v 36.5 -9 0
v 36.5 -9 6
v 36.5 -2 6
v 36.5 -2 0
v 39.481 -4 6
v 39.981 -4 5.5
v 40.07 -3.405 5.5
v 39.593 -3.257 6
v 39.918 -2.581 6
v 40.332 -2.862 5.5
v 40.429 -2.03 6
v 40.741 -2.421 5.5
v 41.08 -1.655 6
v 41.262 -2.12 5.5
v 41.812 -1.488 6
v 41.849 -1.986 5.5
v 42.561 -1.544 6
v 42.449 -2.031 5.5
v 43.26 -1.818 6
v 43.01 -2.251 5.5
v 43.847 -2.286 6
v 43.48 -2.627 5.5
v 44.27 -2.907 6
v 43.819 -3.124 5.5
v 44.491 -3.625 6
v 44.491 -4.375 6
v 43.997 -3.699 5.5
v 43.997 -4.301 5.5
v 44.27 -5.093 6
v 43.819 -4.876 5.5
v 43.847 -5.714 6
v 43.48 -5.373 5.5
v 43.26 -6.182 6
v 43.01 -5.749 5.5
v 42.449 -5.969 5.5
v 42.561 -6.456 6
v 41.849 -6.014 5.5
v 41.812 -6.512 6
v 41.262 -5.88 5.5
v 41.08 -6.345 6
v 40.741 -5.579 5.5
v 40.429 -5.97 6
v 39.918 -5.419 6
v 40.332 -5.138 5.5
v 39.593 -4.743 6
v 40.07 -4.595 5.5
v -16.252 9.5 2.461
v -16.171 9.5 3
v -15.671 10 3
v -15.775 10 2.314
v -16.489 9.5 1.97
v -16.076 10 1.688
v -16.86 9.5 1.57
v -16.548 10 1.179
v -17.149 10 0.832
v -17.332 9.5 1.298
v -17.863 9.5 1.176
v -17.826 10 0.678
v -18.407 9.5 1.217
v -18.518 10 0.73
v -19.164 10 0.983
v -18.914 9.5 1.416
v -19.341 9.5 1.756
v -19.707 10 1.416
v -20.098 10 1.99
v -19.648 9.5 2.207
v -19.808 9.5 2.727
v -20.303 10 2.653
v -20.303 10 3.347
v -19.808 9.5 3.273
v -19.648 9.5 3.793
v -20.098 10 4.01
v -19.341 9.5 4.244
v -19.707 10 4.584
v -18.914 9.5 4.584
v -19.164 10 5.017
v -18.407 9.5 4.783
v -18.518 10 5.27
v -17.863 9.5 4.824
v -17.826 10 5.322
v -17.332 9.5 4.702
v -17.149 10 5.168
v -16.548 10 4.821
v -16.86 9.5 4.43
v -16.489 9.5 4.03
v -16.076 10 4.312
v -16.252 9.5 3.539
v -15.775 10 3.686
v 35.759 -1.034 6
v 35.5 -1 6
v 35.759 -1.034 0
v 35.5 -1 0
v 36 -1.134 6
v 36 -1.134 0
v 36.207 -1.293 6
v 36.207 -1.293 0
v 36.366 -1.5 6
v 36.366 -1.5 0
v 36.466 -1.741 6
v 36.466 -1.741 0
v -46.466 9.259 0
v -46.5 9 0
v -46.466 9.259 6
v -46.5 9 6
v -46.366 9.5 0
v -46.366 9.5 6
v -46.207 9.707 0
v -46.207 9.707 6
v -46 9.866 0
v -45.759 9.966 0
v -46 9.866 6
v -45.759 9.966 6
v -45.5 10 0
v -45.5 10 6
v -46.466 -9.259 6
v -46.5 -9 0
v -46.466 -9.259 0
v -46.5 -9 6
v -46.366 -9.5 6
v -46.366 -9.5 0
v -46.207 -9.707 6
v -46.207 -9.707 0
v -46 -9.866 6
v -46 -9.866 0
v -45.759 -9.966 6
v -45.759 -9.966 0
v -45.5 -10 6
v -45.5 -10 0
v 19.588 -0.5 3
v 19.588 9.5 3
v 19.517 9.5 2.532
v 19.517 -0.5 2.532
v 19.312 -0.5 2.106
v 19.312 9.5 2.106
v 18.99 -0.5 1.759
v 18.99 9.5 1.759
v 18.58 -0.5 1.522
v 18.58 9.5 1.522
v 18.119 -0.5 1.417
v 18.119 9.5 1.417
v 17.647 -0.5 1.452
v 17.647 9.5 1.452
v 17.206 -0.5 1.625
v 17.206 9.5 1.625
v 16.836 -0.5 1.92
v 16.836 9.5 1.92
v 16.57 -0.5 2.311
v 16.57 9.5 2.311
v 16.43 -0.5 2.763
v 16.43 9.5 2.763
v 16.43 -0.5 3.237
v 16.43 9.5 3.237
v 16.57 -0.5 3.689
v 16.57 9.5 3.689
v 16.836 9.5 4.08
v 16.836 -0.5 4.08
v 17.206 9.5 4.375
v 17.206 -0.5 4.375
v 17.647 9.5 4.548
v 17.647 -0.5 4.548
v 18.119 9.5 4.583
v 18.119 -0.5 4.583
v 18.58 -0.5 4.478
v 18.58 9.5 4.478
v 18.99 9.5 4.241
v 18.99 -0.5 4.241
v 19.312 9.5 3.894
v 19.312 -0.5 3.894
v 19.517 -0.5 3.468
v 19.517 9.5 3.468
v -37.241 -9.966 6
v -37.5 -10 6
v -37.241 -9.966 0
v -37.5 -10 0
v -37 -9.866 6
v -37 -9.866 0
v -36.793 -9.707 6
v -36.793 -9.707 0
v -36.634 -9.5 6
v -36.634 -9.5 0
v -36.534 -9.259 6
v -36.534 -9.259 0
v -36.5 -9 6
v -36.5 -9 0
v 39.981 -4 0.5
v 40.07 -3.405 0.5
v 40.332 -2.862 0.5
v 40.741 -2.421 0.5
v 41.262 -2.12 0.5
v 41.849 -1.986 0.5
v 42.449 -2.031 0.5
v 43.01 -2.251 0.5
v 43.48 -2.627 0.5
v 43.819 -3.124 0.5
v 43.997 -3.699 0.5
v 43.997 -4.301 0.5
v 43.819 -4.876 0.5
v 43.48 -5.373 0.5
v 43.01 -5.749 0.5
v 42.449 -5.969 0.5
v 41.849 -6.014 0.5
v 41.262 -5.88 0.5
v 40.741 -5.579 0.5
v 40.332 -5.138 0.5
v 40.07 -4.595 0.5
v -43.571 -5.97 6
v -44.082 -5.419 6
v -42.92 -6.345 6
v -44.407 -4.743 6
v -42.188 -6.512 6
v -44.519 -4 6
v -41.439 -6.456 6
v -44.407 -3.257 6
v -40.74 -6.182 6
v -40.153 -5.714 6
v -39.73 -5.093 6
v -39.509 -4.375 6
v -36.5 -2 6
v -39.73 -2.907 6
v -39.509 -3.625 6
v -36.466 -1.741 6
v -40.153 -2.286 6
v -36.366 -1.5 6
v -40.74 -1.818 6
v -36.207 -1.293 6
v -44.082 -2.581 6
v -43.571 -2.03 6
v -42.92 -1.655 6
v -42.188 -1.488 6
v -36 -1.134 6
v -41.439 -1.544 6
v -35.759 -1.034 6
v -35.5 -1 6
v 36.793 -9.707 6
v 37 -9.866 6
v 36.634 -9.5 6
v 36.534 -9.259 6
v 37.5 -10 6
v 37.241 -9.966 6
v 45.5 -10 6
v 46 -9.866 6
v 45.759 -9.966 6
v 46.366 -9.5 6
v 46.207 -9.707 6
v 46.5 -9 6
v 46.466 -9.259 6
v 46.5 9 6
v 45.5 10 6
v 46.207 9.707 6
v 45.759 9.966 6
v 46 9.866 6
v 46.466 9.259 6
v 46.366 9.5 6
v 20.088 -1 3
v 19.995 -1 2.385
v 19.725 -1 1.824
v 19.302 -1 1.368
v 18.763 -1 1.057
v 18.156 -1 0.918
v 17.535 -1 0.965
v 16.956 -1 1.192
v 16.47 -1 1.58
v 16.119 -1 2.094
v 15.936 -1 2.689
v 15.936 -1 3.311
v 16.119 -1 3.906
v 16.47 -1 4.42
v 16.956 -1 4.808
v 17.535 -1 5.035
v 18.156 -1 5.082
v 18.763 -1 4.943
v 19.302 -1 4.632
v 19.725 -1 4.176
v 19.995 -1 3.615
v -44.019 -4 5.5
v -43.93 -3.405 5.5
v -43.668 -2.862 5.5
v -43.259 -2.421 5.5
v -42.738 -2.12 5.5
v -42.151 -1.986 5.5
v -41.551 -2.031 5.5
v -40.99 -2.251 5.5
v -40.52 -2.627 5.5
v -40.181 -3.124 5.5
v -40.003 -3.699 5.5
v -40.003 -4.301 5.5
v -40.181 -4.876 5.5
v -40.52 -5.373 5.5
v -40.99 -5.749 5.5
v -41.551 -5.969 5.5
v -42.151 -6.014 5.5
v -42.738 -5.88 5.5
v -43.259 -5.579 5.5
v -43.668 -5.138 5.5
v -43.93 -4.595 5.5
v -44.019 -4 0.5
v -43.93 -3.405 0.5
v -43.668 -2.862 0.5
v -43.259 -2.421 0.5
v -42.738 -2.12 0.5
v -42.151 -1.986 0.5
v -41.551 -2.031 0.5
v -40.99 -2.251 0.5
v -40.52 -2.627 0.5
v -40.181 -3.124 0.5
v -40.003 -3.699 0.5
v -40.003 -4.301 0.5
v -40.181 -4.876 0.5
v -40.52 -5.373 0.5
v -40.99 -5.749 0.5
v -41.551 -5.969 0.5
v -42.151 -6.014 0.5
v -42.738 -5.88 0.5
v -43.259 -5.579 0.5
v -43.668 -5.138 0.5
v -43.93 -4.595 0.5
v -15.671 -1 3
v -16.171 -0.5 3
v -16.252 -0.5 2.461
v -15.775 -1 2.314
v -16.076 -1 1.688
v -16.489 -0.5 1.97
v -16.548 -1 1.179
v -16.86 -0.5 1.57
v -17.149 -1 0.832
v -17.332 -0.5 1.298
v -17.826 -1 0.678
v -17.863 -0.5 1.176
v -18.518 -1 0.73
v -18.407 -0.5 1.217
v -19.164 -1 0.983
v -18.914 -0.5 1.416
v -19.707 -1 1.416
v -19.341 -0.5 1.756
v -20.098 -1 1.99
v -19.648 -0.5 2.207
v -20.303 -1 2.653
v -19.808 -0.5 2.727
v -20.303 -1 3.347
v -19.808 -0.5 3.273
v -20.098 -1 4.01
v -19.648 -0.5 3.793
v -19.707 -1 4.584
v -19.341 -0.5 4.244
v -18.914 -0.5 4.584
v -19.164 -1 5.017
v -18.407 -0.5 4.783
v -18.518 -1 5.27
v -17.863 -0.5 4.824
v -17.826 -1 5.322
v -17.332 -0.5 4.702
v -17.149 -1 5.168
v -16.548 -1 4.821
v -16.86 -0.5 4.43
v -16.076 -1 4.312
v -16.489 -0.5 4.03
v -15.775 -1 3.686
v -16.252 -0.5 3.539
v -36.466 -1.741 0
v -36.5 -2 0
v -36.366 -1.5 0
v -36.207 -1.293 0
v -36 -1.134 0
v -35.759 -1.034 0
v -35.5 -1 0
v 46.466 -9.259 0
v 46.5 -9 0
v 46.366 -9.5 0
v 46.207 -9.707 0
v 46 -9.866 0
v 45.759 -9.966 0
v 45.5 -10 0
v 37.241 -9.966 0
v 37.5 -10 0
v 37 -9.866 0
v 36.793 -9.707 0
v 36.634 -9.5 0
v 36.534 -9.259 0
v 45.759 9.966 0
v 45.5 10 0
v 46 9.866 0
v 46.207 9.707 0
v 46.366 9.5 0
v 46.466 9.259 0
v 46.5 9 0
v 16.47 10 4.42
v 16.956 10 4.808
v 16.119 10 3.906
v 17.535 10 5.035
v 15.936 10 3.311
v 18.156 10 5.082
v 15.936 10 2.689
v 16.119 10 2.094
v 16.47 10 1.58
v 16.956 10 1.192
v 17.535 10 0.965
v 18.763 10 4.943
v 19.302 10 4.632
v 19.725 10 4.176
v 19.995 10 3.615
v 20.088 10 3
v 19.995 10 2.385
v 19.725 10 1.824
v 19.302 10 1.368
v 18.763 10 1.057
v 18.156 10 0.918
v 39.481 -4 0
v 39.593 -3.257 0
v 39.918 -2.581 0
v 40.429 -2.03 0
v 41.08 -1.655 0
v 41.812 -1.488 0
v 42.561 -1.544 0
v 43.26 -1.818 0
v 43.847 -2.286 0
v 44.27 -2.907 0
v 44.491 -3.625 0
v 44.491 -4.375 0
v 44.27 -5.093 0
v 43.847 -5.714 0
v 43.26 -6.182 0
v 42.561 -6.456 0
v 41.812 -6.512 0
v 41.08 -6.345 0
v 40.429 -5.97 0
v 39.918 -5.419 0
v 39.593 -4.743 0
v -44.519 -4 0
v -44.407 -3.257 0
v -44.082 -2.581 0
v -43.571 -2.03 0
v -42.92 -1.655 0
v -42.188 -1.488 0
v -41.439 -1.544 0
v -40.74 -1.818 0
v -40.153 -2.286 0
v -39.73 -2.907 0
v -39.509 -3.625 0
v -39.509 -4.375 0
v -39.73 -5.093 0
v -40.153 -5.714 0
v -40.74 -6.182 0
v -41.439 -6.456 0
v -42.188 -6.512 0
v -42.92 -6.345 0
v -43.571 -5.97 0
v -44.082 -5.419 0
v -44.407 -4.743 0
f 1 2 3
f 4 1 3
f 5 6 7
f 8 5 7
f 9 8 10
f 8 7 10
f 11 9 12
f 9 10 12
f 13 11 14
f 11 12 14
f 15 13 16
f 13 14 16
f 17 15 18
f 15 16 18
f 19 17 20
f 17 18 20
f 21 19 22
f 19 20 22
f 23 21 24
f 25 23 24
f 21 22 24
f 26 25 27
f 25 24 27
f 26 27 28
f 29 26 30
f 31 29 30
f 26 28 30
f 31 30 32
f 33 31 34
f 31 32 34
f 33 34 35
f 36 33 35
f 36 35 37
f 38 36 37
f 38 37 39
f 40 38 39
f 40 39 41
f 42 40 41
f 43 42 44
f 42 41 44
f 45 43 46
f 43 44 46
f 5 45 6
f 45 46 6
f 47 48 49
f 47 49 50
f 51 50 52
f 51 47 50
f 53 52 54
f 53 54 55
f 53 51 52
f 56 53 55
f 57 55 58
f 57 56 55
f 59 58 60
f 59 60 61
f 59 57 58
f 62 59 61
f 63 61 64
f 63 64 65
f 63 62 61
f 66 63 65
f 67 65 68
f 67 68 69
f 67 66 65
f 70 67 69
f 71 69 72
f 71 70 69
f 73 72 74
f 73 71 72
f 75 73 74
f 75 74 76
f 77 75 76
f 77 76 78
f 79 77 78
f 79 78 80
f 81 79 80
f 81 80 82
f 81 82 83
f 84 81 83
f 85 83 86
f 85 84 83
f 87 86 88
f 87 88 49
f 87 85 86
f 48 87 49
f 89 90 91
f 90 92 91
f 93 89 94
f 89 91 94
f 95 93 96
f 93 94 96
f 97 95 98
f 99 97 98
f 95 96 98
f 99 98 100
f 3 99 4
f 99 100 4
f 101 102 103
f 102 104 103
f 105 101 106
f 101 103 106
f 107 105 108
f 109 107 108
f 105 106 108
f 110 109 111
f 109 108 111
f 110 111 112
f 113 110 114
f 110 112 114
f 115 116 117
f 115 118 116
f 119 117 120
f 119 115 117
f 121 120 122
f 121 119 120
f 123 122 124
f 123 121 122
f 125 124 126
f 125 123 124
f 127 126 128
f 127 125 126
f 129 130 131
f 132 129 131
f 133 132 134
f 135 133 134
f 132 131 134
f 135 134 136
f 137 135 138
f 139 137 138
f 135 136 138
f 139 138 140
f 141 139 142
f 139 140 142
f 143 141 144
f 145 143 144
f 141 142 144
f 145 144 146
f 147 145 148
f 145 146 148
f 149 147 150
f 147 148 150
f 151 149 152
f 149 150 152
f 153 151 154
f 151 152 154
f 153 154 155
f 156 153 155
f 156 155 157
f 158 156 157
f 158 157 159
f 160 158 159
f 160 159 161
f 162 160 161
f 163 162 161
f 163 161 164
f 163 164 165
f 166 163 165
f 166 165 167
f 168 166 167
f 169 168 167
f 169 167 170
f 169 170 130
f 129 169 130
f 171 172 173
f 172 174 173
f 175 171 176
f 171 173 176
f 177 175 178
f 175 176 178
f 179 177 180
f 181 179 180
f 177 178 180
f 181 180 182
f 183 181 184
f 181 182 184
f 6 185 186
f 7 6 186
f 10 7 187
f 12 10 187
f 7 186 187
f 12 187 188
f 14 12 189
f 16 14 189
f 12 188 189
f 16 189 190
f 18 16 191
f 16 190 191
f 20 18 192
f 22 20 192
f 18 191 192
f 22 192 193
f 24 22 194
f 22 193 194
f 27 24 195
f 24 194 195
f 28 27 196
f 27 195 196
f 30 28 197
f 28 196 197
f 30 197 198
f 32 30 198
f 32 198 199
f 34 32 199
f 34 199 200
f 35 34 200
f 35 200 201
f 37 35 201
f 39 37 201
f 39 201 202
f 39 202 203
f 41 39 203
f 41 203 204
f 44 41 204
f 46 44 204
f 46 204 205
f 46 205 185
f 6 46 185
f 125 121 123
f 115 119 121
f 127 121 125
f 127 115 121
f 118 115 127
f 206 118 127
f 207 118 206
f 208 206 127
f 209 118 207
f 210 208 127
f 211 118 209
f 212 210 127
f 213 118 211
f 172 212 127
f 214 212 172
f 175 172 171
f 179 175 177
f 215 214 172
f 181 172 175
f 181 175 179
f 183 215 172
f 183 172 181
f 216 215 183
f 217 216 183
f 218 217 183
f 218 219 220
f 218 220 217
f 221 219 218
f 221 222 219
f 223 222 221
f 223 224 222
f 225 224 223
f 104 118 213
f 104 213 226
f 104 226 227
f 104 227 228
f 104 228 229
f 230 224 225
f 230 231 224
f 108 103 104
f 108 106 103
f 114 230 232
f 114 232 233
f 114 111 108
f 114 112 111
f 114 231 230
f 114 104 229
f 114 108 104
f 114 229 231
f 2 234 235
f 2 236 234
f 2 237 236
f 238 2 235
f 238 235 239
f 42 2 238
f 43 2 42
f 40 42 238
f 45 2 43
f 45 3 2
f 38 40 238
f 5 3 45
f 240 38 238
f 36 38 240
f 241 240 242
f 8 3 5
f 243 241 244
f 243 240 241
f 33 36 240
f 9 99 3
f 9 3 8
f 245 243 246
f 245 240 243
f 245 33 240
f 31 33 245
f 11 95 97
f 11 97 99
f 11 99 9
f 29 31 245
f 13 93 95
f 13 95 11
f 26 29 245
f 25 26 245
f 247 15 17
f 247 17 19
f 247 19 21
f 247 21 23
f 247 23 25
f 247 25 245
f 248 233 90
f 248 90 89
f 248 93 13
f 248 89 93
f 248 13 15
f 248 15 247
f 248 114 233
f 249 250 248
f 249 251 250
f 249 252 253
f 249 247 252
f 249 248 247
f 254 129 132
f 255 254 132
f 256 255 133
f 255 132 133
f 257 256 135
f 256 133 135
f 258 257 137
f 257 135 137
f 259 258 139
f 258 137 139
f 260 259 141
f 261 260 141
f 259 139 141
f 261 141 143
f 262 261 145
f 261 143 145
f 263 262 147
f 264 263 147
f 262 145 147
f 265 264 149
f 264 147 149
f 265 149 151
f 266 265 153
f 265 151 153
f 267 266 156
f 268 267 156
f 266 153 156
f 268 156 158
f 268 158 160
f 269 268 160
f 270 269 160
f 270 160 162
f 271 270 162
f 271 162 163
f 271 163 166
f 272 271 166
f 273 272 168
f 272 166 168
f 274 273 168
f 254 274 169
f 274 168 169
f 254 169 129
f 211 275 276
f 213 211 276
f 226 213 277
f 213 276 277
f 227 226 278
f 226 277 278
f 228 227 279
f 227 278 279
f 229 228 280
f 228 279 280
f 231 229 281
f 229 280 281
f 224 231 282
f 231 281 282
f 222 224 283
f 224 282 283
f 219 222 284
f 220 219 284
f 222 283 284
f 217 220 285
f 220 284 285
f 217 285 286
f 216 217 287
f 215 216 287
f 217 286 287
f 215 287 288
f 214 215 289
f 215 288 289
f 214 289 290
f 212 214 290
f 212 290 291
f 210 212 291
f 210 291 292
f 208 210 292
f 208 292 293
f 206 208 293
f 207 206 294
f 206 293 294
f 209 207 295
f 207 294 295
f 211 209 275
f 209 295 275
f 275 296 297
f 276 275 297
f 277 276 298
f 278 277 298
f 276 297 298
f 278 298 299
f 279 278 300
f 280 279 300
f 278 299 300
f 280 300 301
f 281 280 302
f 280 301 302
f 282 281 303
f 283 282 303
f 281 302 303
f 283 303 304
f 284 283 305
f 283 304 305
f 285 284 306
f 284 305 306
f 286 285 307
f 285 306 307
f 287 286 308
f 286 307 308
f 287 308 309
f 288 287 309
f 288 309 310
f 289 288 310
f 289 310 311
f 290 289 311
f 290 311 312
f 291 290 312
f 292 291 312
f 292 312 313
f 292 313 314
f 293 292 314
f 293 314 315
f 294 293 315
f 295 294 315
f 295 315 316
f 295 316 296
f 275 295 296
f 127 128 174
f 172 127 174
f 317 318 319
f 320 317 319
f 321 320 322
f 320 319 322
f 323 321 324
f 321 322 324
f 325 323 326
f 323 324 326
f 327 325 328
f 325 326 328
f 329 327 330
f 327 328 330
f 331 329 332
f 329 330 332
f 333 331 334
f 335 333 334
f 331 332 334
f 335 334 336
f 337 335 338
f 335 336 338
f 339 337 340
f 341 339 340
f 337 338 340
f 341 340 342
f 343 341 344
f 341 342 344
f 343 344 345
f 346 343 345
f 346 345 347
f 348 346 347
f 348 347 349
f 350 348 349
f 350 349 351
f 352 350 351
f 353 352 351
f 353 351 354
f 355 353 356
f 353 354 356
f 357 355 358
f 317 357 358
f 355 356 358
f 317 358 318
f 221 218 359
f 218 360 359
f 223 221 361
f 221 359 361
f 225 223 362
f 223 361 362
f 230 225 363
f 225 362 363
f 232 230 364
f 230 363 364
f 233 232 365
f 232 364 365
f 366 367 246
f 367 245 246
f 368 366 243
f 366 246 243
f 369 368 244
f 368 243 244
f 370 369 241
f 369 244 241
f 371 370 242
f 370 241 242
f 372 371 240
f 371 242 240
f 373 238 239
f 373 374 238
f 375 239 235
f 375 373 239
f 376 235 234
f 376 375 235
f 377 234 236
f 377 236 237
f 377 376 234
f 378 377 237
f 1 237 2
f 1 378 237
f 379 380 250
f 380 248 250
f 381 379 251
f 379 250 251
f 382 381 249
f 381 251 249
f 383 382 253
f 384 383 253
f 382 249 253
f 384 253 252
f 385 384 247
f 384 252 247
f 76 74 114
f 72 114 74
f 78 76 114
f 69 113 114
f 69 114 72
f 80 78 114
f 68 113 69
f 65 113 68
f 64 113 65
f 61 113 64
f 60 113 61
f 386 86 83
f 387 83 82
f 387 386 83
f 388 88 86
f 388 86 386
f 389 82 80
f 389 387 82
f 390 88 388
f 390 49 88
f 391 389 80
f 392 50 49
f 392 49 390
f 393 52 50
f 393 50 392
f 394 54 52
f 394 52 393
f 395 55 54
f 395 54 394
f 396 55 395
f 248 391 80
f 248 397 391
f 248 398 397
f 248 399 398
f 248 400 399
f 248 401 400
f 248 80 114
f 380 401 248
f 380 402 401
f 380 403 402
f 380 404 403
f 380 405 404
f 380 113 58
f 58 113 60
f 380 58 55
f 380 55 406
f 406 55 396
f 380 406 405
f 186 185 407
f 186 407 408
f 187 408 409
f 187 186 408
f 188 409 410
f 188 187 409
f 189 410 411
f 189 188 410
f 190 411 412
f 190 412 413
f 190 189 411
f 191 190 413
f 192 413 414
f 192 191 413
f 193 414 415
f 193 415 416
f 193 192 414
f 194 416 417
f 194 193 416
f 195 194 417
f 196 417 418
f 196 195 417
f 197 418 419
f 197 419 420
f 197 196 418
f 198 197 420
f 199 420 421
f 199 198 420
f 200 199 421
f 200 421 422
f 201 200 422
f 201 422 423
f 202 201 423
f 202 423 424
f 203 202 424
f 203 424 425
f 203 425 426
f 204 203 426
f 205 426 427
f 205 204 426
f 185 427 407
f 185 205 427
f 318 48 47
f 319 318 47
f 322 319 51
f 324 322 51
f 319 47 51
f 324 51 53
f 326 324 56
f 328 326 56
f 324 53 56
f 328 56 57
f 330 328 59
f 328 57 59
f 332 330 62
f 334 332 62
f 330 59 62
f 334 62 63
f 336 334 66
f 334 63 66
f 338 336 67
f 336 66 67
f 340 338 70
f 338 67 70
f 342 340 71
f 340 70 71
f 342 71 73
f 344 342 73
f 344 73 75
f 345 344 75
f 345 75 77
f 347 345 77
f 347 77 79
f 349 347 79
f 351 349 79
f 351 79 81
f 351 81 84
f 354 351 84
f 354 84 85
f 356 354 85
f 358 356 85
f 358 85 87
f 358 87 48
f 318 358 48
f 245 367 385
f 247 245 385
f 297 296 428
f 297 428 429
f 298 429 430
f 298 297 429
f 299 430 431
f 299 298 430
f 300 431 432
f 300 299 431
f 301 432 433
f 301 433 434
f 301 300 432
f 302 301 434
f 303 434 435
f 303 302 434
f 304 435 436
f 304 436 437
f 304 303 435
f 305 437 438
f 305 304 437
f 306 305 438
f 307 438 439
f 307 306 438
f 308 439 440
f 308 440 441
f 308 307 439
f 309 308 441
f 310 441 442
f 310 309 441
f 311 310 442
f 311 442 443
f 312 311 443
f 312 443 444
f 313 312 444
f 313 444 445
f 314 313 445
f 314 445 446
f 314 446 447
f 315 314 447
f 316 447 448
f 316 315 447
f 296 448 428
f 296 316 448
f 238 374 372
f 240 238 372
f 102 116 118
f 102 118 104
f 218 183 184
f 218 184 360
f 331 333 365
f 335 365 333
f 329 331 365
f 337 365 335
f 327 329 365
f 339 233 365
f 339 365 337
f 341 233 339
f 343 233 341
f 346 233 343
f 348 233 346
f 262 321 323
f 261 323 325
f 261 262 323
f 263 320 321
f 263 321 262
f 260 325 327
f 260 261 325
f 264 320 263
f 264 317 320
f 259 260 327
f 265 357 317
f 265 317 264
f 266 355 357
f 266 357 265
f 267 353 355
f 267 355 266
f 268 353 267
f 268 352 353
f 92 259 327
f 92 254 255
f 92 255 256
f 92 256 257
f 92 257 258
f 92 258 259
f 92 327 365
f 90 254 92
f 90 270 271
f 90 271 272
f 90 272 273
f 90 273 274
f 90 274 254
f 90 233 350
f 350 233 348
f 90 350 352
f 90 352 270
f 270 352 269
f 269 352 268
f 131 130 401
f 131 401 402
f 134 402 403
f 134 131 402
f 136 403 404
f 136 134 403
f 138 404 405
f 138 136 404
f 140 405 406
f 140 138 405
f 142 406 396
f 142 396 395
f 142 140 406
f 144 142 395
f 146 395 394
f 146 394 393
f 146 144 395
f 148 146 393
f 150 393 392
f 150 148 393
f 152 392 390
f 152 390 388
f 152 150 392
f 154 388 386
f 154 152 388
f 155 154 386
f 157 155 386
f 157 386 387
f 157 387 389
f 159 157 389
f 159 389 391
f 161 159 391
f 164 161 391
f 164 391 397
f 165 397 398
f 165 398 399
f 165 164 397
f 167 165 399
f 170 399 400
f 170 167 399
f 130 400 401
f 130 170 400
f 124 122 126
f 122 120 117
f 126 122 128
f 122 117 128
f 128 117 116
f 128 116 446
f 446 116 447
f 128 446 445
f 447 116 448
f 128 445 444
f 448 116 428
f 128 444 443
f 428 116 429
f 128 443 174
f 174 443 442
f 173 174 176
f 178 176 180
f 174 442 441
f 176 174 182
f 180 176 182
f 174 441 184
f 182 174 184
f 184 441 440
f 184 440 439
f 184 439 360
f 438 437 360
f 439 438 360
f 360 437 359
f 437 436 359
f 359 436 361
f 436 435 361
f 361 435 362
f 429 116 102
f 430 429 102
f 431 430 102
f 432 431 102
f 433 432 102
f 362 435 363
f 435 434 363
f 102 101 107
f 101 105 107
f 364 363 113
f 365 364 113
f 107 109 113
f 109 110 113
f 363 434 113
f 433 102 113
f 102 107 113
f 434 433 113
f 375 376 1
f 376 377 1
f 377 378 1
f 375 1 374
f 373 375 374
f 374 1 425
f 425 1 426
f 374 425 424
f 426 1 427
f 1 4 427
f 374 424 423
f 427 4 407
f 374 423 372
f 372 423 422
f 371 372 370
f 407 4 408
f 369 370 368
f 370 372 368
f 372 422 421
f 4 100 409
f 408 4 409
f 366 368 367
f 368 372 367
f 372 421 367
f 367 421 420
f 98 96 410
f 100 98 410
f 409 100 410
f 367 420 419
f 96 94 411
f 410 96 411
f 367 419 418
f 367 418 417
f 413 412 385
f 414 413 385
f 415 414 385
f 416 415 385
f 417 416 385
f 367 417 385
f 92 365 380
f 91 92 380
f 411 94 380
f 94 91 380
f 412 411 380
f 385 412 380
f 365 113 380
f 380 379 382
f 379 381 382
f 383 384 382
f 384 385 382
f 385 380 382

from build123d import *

# Parameters (mm, degrees)
SKETCH1_W                    = 93
SKETCH1_H                    = 20
BOSS_EXTRUDE1_DEPTH          = 6
CUT_EXTRUDE2_REACH           = 49.94
SKETCH3_W                    = 73
SKETCH3_H                    = 9
F_6_CLEARANCE_HOLE1_D        = 3.6576
TAP_DRILL_FOR_10_32_TAP1_D   = 4.0386
F_1_8_0_125_DIAMETER_HOLE1_D = 3.175
FILLET1_R                    = 1
CHAMFER2_SIZE                = 0.5


with BuildPart() as part:
    # Sketch1 → Boss-Extrude1 (new body)
    with BuildSketch(Plane.XY):
        Rectangle(SKETCH1_W, SKETCH1_H)
    extrude(amount=BOSS_EXTRUDE1_DEPTH)

    # Sketch3 → Cut-Extrude2 (cut, up to next)
    with BuildSketch(Plane.XY.offset(6), mode=Mode.PRIVATE) as cut_extrude2_sk1:
        with Locations((0, -5.5)):
            Rectangle(SKETCH3_W, SKETCH3_H)
    cut_extrude2_tool1 = extrude(cut_extrude2_sk1.sketch, amount=-CUT_EXTRUDE2_REACH, mode=Mode.PRIVATE) & part.part
    add(cut_extrude2_tool1.solids().sort_by_distance((0, -5.5, 6))[0], mode=Mode.SUBTRACT)

    # #6 Clearance Hole1 (through all)
    with Locations(Plane(origin=(0, -1, 0), x_dir=(-1, 0, 0), z_dir=(0, -1, 0))):
        with Locations((18, -3)):
            Hole(F_6_CLEARANCE_HOLE1_D / 2)

    # Tap Drill for #10-32 Tap1 (through all)
    with Locations(Plane.XY.offset(6)):
        with Locations((-42, -4), (42, -4)):
            Hole(TAP_DRILL_FOR_10_32_TAP1_D / 2)

    # 1/8 (0.125) Diameter Hole1 (through all)
    with Locations(Plane(origin=(0, -1, 0), x_dir=(-1, 0, 0), z_dir=(0, -1, 0))):
        with Locations((-18, -3)):
            Hole(F_1_8_0_125_DIAMETER_HOLE1_D / 2)

    # Fillet1
    fillet1_edges = [part.edges().sort_by_distance(p)[0] for p in [
        (-36.5, -10, 3),
        (-36.5, -1, 3),
        (36.5, -1, 3),
        (36.5, -10, 3),
        (46.5, -10, 3),
        (-46.5, -10, 3),
        (-46.5, 10, 3),
        (46.5, 10, 3),
    ]]
    fillet(fillet1_edges, radius=FILLET1_R)

    # Chamfer2
    chamfer2_edges = [part.edges().sort_by_distance(p)[0] for p in [
        (-19.8288, -1, 3),
        (-19.8288, 10, 3),
        (44.0193, -4, 6),
        (44.0193, -4, 0),
        (-39.9807, -4, 6),
        (-39.9807, -4, 0),
        (16.4125, -1, 3),
        (16.4125, 10, 3),
    ]]
    chamfer(chamfer2_edges, length=CHAMFER2_SIZE)


solid = part.part
